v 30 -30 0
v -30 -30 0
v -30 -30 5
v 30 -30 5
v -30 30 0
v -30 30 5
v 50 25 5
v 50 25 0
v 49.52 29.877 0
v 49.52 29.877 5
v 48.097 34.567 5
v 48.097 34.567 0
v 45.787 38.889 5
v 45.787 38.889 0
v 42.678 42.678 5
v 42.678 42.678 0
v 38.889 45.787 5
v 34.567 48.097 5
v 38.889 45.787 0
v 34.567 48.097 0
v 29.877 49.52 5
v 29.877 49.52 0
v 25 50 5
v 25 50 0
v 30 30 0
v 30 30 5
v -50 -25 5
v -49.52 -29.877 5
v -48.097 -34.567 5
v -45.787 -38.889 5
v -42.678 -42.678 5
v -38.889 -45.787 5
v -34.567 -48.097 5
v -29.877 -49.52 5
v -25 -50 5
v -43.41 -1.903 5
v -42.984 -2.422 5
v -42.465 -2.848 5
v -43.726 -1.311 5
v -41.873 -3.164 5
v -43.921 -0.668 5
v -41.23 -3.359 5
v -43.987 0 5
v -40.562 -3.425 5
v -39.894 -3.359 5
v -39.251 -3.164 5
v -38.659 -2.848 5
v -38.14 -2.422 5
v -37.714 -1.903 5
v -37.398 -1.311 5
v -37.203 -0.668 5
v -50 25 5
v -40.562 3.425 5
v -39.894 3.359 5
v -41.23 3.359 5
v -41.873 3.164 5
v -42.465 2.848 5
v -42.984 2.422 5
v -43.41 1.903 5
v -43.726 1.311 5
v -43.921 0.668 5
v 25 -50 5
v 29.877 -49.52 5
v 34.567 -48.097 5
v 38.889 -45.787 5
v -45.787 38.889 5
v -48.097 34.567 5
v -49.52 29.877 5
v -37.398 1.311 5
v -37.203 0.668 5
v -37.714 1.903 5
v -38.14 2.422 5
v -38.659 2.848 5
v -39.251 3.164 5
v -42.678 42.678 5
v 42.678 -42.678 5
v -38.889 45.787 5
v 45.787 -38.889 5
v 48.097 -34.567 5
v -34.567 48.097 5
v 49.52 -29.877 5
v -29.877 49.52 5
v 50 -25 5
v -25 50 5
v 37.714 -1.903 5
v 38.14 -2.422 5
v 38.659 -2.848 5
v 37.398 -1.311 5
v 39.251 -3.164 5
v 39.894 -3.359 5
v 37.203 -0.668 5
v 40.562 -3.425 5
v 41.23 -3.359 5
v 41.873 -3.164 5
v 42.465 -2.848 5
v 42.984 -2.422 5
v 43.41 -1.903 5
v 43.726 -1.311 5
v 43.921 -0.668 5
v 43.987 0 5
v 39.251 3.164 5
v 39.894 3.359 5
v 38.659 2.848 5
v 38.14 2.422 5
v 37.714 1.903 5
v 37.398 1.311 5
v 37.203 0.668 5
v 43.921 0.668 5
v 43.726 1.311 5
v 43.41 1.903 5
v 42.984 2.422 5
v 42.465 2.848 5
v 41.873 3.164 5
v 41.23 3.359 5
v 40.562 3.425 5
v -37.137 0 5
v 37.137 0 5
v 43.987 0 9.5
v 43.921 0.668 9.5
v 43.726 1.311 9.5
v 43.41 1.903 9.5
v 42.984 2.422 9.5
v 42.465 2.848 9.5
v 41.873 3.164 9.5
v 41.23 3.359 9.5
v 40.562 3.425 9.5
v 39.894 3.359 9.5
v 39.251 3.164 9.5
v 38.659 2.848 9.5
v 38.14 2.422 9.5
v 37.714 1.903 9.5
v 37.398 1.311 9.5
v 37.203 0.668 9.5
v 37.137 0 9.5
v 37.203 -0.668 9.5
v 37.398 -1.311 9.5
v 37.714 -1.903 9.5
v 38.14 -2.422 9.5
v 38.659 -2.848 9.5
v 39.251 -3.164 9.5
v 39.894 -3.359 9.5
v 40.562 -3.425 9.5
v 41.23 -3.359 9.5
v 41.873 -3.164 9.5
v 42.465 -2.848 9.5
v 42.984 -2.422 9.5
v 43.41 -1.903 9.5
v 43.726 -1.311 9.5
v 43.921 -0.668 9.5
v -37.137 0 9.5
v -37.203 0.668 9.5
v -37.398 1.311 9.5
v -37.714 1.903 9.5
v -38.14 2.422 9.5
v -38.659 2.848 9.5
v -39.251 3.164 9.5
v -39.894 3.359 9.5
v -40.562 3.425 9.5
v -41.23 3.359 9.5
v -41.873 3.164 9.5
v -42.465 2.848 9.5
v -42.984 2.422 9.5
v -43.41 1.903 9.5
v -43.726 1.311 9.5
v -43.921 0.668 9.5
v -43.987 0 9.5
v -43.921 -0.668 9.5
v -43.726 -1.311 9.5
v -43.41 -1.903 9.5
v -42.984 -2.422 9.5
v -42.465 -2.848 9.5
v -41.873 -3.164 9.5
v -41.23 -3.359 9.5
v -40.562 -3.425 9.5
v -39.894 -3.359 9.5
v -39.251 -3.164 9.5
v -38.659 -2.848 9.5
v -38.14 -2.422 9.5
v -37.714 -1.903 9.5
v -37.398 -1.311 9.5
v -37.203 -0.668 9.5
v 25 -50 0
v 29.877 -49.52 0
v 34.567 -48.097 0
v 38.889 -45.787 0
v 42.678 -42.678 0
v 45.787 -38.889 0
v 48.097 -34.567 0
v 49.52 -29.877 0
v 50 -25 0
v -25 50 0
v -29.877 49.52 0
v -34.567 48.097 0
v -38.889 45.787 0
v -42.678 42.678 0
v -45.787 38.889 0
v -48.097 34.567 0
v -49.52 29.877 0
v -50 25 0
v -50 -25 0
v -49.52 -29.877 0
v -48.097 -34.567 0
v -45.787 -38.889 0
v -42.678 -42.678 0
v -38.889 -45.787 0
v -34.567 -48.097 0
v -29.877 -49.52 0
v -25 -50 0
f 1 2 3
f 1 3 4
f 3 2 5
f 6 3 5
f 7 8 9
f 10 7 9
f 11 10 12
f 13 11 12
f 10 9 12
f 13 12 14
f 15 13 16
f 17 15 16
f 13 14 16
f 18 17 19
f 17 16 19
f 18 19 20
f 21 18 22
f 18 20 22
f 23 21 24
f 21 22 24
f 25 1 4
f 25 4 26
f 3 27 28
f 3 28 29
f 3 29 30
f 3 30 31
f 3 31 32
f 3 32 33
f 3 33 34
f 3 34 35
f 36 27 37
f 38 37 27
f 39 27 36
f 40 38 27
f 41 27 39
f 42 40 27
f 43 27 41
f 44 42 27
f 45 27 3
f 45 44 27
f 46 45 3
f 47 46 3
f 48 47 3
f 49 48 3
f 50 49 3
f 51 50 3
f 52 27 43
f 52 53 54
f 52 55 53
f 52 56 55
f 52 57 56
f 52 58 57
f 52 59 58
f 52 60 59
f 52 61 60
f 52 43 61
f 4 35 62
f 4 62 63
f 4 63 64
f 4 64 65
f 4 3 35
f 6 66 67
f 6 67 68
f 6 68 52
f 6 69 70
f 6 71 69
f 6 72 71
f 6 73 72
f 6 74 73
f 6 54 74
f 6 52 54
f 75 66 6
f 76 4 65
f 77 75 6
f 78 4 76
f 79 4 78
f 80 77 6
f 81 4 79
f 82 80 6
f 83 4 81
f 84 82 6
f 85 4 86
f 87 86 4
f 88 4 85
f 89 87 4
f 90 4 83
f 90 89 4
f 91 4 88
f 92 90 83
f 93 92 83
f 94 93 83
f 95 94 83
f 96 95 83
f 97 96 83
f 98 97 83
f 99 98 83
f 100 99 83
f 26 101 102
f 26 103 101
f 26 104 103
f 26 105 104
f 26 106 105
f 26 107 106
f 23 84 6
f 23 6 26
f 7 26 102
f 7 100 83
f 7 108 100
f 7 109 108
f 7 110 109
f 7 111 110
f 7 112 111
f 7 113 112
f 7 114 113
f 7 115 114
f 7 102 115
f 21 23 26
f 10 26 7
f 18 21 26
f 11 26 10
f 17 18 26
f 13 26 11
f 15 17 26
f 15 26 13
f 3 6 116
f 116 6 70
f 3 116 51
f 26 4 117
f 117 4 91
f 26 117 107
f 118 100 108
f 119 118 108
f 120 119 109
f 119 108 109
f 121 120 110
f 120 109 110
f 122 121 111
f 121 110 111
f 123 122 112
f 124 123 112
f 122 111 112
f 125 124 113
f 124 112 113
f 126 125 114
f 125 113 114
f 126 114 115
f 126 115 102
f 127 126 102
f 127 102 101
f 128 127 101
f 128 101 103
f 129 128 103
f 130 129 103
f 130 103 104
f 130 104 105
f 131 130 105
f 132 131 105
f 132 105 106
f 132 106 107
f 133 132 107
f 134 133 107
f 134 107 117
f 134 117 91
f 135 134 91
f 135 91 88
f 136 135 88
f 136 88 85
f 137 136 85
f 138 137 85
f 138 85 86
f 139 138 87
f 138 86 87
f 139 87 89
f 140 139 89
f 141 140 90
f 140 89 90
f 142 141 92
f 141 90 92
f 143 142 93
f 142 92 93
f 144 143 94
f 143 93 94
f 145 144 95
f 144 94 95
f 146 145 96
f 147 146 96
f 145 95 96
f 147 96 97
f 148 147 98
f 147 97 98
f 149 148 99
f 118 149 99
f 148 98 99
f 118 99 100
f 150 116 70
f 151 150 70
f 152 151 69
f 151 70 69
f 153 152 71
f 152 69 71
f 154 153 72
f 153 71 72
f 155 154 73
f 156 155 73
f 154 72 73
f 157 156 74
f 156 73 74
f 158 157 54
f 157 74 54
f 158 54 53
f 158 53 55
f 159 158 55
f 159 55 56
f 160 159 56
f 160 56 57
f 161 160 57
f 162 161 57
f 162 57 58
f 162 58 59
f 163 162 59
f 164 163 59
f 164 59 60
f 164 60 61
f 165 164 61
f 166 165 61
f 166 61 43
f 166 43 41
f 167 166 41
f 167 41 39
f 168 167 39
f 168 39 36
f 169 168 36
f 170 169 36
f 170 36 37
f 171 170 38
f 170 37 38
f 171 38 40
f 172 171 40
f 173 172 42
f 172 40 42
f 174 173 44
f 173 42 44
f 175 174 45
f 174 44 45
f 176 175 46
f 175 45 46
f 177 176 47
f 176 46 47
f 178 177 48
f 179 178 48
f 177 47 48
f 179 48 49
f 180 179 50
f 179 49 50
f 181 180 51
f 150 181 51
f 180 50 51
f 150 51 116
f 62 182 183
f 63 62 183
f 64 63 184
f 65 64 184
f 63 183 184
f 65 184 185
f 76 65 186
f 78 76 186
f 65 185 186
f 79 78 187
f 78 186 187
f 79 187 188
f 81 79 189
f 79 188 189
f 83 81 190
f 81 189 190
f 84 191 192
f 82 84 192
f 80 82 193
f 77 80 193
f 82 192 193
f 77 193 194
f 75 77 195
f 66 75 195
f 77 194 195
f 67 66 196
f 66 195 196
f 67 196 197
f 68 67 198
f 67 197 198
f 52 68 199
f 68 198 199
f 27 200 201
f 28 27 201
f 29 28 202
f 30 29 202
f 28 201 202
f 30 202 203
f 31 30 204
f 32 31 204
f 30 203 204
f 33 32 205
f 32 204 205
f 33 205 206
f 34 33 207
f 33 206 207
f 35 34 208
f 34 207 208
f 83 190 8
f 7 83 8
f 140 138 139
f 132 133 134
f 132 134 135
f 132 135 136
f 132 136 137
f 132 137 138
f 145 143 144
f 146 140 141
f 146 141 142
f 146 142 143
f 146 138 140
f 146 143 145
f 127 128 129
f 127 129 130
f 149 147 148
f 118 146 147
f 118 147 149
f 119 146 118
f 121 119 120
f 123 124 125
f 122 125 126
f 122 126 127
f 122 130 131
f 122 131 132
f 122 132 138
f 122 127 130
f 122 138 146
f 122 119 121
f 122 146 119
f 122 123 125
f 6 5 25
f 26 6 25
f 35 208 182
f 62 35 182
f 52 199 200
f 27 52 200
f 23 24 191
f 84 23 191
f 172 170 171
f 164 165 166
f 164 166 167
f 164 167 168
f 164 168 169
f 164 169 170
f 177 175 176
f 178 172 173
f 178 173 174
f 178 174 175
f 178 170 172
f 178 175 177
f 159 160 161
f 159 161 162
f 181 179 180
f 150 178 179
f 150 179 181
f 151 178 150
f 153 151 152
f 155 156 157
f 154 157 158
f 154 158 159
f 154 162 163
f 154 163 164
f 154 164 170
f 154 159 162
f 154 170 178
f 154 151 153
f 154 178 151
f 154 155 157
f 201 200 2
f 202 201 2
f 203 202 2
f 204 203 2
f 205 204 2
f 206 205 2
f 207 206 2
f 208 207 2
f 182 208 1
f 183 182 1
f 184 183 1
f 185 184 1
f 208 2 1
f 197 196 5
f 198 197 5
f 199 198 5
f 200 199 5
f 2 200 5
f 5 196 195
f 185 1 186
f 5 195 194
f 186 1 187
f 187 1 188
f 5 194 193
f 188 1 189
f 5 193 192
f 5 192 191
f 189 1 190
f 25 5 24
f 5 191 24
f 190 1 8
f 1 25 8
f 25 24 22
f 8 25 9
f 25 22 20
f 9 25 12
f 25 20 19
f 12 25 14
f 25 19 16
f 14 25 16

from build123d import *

# Parameters (mm, degrees)
F0_R     = 3.425
F0_W     = 60
F0_H     = 60
F1_DEPTH = 5
F2_DEPTH = 9.5


with BuildPart() as f1:
    # F0 (on Top) → F1 (new body)
    with BuildSketch(Plane.XY):
        with BuildLine():
            Line((-25, -50), (25, -50))
            ThreePointArc((25, -50), (42.67767, -42.67767), (50, -25))
            Line((50, -25), (50, 25))
            ThreePointArc((50, 25), (42.67767, 42.67767), (25, 50))
            Line((25, 50), (-25, 50))
            ThreePointArc((-25, 50), (-42.67767, 42.67767), (-50, 25))
            Line((-50, 25), (-50, -25))
            ThreePointArc((-50, -25), (-42.67767, -42.67767), (-25, -50))
        make_face()
        with Locations((-40.562063, 0)):
            Circle(F0_R, mode=Mode.SUBTRACT)
        Rectangle(F0_W, F0_H, mode=Mode.SUBTRACT)
        with Locations((40.562063, 0)):
            Circle(F0_R, mode=Mode.SUBTRACT)
    extrude(amount=F1_DEPTH)

    # F0 (on Top) → F2 (join)
    with BuildSketch(Plane.XY):
        with Locations((-40.562063, 0)):
            Circle(F0_R)
        with Locations((40.562063, 0)):
            Circle(F0_R)
    extrude(amount=F2_DEPTH)


solid = f1.part
